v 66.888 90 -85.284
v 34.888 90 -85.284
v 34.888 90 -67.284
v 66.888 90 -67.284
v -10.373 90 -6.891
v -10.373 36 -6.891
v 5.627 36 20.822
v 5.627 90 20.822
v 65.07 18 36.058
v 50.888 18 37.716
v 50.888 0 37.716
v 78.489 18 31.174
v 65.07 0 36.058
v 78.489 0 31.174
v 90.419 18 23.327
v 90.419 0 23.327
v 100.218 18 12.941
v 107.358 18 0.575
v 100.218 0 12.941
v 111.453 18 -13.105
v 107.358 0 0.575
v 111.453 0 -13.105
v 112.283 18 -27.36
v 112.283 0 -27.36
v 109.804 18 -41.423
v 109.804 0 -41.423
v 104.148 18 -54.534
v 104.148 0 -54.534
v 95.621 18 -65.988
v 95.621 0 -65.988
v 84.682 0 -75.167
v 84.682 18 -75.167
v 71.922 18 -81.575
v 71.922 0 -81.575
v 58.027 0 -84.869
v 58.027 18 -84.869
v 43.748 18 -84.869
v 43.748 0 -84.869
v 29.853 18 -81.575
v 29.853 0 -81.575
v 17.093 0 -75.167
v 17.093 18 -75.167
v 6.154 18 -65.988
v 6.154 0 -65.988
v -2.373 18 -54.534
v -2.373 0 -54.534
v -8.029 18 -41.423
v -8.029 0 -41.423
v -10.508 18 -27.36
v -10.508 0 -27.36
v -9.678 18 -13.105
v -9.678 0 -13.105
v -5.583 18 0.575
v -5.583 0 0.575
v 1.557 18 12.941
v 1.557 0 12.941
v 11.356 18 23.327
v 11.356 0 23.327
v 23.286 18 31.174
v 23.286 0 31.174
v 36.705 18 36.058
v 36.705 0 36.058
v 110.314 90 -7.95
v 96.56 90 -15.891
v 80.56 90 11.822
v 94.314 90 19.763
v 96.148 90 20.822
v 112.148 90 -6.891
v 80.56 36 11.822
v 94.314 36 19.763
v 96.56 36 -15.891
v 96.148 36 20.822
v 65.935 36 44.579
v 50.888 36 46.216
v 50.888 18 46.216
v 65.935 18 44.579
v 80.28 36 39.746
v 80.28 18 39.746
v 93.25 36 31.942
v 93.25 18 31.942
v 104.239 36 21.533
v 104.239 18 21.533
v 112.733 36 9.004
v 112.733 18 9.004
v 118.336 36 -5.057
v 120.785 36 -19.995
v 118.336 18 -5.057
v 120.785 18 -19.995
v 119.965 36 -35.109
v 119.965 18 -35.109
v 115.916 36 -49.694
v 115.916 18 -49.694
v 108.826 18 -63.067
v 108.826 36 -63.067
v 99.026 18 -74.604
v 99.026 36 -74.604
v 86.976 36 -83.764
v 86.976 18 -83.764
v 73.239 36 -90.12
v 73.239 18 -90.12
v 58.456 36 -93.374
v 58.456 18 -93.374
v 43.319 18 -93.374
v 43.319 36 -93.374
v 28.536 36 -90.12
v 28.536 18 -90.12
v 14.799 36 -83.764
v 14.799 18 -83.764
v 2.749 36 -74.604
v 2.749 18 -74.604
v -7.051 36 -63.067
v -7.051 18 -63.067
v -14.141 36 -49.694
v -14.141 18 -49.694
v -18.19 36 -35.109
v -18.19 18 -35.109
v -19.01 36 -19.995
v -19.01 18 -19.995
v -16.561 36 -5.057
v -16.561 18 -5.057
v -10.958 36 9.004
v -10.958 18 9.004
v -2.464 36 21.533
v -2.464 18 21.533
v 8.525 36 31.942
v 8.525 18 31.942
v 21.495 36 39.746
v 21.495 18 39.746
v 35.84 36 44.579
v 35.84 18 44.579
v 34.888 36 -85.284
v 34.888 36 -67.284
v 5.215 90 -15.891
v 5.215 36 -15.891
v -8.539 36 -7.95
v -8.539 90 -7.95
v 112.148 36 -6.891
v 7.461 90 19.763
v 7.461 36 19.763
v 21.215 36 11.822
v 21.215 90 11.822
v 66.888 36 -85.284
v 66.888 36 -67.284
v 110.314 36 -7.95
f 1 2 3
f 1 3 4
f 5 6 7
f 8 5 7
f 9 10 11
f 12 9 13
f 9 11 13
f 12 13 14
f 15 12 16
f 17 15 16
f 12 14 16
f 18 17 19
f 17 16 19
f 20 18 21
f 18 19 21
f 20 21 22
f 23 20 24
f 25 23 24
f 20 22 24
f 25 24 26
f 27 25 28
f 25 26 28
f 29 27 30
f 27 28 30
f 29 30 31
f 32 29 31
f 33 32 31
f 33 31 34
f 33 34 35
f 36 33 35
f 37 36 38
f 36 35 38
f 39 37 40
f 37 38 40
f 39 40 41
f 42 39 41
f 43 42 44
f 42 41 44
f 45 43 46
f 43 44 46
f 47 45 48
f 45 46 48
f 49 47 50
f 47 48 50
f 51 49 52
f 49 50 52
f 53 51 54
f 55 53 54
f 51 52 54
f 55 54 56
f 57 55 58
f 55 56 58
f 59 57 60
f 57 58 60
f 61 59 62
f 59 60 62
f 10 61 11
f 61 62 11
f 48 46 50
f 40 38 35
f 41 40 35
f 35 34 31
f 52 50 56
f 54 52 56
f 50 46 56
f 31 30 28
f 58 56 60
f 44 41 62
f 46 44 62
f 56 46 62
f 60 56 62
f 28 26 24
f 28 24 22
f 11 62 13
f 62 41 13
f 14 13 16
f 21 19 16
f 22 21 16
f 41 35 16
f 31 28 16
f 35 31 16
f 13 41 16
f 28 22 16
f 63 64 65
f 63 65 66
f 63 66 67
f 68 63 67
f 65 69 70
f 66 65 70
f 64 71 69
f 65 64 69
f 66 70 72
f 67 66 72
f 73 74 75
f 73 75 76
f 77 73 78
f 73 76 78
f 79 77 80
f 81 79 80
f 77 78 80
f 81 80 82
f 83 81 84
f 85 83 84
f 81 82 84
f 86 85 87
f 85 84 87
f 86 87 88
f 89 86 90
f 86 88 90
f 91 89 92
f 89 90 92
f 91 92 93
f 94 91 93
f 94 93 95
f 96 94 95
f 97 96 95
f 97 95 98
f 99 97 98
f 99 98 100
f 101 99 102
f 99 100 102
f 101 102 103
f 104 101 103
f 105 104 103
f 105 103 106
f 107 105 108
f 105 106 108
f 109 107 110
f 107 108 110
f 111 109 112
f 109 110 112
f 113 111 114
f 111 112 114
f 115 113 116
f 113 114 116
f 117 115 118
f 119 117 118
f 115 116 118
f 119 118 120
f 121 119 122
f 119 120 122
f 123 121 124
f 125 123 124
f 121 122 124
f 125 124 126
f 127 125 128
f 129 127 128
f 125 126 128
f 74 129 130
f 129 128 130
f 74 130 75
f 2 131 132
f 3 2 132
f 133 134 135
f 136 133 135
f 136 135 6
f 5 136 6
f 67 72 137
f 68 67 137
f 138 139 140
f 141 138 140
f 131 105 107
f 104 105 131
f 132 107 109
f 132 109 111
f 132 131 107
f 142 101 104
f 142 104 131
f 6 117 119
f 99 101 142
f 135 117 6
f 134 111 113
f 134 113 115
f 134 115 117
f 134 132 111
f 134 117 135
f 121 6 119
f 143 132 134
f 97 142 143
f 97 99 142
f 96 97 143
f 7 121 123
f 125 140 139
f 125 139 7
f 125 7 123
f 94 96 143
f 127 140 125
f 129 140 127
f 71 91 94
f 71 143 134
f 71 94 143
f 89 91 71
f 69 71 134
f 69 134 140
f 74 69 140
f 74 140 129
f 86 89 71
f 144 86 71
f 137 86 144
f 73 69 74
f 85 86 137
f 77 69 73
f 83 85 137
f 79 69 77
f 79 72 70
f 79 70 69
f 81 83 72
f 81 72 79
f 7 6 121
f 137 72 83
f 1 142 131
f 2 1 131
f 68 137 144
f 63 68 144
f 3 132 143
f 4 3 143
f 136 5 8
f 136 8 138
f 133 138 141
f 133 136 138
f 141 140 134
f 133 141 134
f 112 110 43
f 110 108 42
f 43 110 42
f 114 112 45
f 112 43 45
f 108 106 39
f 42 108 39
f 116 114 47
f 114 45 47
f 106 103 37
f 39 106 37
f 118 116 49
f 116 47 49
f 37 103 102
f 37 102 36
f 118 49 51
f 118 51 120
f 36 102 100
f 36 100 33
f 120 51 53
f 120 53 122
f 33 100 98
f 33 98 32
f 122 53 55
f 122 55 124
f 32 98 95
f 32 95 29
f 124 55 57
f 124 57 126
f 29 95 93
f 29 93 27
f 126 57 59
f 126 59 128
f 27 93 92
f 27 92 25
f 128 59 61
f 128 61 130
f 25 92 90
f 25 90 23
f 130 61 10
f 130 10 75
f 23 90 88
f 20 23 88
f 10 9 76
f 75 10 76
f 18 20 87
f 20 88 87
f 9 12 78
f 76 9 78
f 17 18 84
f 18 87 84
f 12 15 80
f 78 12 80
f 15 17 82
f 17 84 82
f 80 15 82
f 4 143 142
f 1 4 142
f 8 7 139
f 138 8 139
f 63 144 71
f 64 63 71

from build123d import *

# Parameters (mm, degrees)
ESQUISSE2_R        = 61.5
BOSS_EXTRU_1_DEPTH = 18
ESQUISSE3_R        = 70
BOSS_EXTRU_2_DEPTH = 18
BOSS_EXTRU_3_DEPTH = 54


with BuildPart() as part:
    # Esquisse2 → Boss.-Extru.1 (new body)
    with BuildSketch(Plane(origin=(0, 0, 0), x_dir=(1, 0, 0), z_dir=(0, 1, 0))):
        with Locations(Location((50.887518325, 23.784383565, 0), (0, 0, 270))):
            Circle(ESQUISSE2_R)
    extrude(amount=BOSS_EXTRU_1_DEPTH)

    # Esquisse3 → Boss.-Extru.2 (add)
    with BuildSketch(Plane(origin=(0, 18, 0), x_dir=(1, 0, 0), z_dir=(0, 1, 0))):
        with Locations(Location((50.887518325, 23.784383565, 0), (0, 0, 270))):
            Circle(ESQUISSE3_R)
    extrude(amount=BOSS_EXTRU_2_DEPTH)

    # Esquisse4 → Boss.-Extru.3 (add)
    with BuildSketch(Plane(origin=(0, 36, 0), x_dir=(1, 0, 0), z_dir=(0, 1, 0))):
        with BuildLine():
            ThreePointArc((-2.373044008, -6.965616435), (2.122342369, -13.688374727), (7.460993068, -19.763141096))
            Line((7.460993068, -19.763141096), (21.215413261, -11.822022896))
            Line((21.215413261, -11.822022896), (13.215413261, 2.034383565))
            Line((13.215413261, 2.034383565), (5.215413261, 15.890790026))
            Line((5.215413261, 15.890790026), (-8.539006932, 7.949671825))
            ThreePointArc((-8.539006932, 7.949671825), (-5.947430283, 0.288881513), (-2.373044008, -6.965616435))
        make_face()
        with BuildLine():
            Line((66.887518325, 67.284383565), (66.887518325, 83.166619966))
            ThreePointArc((66.887518325, 83.166619966), (58.957290978, 84.752643909), (50.887518325, 85.284383565))
            ThreePointArc((50.887518325, 85.284383565), (42.817745673, 84.752643909), (34.887518325, 83.166619966))
            Line((34.887518325, 83.166619966), (34.887518325, 67.284383565))
            Line((34.887518325, 67.284383565), (50.887518325, 67.284383565))
            Line((50.887518325, 67.284383565), (66.887518325, 67.284383565))
        make_face()
        with BuildLine():
            ThreePointArc((94.314043582, -19.763141096), (99.652694281, -13.688374727), (104.148080658, -6.965616435))
            ThreePointArc((104.148080658, -6.965616435), (107.722466934, 0.288881513), (110.314043582, 7.949671825))
            Line((110.314043582, 7.949671825), (96.55962339, 15.890790026))
            Line((96.55962339, 15.890790026), (88.55962339, 2.034383565))
            Line((88.55962339, 2.034383565), (80.55962339, -11.822022896))
            Line((80.55962339, -11.822022896), (94.314043582, -19.763141096))
        make_face()
        with BuildLine():
            ThreePointArc((110.314043582, 7.949671825), (107.722466934, 0.288881513), (104.148080658, -6.965616435))
            Line((104.148080658, -6.965616435), (112.148080658, 6.890790026))
            Line((112.148080658, 6.890790026), (110.314043582, 7.949671825))
        make_face()
        with BuildLine():
            Line((96.148080658, -20.822022896), (104.148080658, -6.965616435))
            ThreePointArc((104.148080658, -6.965616435), (99.652694281, -13.688374727), (94.314043582, -19.763141096))
            Line((94.314043582, -19.763141096), (96.148080658, -20.822022896))
        make_face()
        with BuildLine():
            ThreePointArc((50.887518325, 85.284383565), (58.957290978, 84.752643909), (66.887518325, 83.166619966))
            Line((66.887518325, 83.166619966), (66.887518325, 85.284383565))
            Line((66.887518325, 85.284383565), (50.887518325, 85.284383565))
        make_face()
        with BuildLine():
            ThreePointArc((34.887518325, 83.166619966), (42.817745673, 84.752643909), (50.887518325, 85.284383565))
            Line((50.887518325, 85.284383565), (34.887518325, 85.284383565))
            Line((34.887518325, 85.284383565), (34.887518325, 83.166619966))
        make_face()
        with BuildLine():
            Line((5.626955992, -20.822022896), (7.460993068, -19.763141096))
            ThreePointArc((7.460993068, -19.763141096), (2.122342369, -13.688374727), (-2.373044008, -6.965616435))
            Line((-2.373044008, -6.965616435), (5.626955992, -20.822022896))
        make_face()
        with BuildLine():
            Line((-10.373044008, 6.890790026), (-2.373044008, -6.965616435))
            ThreePointArc((-2.373044008, -6.965616435), (-5.947430283, 0.288881513), (-8.539006932, 7.949671825))
            Line((-8.539006932, 7.949671825), (-10.373044008, 6.890790026))
        make_face()
    extrude(amount=BOSS_EXTRU_3_DEPTH)


solid = part.part
